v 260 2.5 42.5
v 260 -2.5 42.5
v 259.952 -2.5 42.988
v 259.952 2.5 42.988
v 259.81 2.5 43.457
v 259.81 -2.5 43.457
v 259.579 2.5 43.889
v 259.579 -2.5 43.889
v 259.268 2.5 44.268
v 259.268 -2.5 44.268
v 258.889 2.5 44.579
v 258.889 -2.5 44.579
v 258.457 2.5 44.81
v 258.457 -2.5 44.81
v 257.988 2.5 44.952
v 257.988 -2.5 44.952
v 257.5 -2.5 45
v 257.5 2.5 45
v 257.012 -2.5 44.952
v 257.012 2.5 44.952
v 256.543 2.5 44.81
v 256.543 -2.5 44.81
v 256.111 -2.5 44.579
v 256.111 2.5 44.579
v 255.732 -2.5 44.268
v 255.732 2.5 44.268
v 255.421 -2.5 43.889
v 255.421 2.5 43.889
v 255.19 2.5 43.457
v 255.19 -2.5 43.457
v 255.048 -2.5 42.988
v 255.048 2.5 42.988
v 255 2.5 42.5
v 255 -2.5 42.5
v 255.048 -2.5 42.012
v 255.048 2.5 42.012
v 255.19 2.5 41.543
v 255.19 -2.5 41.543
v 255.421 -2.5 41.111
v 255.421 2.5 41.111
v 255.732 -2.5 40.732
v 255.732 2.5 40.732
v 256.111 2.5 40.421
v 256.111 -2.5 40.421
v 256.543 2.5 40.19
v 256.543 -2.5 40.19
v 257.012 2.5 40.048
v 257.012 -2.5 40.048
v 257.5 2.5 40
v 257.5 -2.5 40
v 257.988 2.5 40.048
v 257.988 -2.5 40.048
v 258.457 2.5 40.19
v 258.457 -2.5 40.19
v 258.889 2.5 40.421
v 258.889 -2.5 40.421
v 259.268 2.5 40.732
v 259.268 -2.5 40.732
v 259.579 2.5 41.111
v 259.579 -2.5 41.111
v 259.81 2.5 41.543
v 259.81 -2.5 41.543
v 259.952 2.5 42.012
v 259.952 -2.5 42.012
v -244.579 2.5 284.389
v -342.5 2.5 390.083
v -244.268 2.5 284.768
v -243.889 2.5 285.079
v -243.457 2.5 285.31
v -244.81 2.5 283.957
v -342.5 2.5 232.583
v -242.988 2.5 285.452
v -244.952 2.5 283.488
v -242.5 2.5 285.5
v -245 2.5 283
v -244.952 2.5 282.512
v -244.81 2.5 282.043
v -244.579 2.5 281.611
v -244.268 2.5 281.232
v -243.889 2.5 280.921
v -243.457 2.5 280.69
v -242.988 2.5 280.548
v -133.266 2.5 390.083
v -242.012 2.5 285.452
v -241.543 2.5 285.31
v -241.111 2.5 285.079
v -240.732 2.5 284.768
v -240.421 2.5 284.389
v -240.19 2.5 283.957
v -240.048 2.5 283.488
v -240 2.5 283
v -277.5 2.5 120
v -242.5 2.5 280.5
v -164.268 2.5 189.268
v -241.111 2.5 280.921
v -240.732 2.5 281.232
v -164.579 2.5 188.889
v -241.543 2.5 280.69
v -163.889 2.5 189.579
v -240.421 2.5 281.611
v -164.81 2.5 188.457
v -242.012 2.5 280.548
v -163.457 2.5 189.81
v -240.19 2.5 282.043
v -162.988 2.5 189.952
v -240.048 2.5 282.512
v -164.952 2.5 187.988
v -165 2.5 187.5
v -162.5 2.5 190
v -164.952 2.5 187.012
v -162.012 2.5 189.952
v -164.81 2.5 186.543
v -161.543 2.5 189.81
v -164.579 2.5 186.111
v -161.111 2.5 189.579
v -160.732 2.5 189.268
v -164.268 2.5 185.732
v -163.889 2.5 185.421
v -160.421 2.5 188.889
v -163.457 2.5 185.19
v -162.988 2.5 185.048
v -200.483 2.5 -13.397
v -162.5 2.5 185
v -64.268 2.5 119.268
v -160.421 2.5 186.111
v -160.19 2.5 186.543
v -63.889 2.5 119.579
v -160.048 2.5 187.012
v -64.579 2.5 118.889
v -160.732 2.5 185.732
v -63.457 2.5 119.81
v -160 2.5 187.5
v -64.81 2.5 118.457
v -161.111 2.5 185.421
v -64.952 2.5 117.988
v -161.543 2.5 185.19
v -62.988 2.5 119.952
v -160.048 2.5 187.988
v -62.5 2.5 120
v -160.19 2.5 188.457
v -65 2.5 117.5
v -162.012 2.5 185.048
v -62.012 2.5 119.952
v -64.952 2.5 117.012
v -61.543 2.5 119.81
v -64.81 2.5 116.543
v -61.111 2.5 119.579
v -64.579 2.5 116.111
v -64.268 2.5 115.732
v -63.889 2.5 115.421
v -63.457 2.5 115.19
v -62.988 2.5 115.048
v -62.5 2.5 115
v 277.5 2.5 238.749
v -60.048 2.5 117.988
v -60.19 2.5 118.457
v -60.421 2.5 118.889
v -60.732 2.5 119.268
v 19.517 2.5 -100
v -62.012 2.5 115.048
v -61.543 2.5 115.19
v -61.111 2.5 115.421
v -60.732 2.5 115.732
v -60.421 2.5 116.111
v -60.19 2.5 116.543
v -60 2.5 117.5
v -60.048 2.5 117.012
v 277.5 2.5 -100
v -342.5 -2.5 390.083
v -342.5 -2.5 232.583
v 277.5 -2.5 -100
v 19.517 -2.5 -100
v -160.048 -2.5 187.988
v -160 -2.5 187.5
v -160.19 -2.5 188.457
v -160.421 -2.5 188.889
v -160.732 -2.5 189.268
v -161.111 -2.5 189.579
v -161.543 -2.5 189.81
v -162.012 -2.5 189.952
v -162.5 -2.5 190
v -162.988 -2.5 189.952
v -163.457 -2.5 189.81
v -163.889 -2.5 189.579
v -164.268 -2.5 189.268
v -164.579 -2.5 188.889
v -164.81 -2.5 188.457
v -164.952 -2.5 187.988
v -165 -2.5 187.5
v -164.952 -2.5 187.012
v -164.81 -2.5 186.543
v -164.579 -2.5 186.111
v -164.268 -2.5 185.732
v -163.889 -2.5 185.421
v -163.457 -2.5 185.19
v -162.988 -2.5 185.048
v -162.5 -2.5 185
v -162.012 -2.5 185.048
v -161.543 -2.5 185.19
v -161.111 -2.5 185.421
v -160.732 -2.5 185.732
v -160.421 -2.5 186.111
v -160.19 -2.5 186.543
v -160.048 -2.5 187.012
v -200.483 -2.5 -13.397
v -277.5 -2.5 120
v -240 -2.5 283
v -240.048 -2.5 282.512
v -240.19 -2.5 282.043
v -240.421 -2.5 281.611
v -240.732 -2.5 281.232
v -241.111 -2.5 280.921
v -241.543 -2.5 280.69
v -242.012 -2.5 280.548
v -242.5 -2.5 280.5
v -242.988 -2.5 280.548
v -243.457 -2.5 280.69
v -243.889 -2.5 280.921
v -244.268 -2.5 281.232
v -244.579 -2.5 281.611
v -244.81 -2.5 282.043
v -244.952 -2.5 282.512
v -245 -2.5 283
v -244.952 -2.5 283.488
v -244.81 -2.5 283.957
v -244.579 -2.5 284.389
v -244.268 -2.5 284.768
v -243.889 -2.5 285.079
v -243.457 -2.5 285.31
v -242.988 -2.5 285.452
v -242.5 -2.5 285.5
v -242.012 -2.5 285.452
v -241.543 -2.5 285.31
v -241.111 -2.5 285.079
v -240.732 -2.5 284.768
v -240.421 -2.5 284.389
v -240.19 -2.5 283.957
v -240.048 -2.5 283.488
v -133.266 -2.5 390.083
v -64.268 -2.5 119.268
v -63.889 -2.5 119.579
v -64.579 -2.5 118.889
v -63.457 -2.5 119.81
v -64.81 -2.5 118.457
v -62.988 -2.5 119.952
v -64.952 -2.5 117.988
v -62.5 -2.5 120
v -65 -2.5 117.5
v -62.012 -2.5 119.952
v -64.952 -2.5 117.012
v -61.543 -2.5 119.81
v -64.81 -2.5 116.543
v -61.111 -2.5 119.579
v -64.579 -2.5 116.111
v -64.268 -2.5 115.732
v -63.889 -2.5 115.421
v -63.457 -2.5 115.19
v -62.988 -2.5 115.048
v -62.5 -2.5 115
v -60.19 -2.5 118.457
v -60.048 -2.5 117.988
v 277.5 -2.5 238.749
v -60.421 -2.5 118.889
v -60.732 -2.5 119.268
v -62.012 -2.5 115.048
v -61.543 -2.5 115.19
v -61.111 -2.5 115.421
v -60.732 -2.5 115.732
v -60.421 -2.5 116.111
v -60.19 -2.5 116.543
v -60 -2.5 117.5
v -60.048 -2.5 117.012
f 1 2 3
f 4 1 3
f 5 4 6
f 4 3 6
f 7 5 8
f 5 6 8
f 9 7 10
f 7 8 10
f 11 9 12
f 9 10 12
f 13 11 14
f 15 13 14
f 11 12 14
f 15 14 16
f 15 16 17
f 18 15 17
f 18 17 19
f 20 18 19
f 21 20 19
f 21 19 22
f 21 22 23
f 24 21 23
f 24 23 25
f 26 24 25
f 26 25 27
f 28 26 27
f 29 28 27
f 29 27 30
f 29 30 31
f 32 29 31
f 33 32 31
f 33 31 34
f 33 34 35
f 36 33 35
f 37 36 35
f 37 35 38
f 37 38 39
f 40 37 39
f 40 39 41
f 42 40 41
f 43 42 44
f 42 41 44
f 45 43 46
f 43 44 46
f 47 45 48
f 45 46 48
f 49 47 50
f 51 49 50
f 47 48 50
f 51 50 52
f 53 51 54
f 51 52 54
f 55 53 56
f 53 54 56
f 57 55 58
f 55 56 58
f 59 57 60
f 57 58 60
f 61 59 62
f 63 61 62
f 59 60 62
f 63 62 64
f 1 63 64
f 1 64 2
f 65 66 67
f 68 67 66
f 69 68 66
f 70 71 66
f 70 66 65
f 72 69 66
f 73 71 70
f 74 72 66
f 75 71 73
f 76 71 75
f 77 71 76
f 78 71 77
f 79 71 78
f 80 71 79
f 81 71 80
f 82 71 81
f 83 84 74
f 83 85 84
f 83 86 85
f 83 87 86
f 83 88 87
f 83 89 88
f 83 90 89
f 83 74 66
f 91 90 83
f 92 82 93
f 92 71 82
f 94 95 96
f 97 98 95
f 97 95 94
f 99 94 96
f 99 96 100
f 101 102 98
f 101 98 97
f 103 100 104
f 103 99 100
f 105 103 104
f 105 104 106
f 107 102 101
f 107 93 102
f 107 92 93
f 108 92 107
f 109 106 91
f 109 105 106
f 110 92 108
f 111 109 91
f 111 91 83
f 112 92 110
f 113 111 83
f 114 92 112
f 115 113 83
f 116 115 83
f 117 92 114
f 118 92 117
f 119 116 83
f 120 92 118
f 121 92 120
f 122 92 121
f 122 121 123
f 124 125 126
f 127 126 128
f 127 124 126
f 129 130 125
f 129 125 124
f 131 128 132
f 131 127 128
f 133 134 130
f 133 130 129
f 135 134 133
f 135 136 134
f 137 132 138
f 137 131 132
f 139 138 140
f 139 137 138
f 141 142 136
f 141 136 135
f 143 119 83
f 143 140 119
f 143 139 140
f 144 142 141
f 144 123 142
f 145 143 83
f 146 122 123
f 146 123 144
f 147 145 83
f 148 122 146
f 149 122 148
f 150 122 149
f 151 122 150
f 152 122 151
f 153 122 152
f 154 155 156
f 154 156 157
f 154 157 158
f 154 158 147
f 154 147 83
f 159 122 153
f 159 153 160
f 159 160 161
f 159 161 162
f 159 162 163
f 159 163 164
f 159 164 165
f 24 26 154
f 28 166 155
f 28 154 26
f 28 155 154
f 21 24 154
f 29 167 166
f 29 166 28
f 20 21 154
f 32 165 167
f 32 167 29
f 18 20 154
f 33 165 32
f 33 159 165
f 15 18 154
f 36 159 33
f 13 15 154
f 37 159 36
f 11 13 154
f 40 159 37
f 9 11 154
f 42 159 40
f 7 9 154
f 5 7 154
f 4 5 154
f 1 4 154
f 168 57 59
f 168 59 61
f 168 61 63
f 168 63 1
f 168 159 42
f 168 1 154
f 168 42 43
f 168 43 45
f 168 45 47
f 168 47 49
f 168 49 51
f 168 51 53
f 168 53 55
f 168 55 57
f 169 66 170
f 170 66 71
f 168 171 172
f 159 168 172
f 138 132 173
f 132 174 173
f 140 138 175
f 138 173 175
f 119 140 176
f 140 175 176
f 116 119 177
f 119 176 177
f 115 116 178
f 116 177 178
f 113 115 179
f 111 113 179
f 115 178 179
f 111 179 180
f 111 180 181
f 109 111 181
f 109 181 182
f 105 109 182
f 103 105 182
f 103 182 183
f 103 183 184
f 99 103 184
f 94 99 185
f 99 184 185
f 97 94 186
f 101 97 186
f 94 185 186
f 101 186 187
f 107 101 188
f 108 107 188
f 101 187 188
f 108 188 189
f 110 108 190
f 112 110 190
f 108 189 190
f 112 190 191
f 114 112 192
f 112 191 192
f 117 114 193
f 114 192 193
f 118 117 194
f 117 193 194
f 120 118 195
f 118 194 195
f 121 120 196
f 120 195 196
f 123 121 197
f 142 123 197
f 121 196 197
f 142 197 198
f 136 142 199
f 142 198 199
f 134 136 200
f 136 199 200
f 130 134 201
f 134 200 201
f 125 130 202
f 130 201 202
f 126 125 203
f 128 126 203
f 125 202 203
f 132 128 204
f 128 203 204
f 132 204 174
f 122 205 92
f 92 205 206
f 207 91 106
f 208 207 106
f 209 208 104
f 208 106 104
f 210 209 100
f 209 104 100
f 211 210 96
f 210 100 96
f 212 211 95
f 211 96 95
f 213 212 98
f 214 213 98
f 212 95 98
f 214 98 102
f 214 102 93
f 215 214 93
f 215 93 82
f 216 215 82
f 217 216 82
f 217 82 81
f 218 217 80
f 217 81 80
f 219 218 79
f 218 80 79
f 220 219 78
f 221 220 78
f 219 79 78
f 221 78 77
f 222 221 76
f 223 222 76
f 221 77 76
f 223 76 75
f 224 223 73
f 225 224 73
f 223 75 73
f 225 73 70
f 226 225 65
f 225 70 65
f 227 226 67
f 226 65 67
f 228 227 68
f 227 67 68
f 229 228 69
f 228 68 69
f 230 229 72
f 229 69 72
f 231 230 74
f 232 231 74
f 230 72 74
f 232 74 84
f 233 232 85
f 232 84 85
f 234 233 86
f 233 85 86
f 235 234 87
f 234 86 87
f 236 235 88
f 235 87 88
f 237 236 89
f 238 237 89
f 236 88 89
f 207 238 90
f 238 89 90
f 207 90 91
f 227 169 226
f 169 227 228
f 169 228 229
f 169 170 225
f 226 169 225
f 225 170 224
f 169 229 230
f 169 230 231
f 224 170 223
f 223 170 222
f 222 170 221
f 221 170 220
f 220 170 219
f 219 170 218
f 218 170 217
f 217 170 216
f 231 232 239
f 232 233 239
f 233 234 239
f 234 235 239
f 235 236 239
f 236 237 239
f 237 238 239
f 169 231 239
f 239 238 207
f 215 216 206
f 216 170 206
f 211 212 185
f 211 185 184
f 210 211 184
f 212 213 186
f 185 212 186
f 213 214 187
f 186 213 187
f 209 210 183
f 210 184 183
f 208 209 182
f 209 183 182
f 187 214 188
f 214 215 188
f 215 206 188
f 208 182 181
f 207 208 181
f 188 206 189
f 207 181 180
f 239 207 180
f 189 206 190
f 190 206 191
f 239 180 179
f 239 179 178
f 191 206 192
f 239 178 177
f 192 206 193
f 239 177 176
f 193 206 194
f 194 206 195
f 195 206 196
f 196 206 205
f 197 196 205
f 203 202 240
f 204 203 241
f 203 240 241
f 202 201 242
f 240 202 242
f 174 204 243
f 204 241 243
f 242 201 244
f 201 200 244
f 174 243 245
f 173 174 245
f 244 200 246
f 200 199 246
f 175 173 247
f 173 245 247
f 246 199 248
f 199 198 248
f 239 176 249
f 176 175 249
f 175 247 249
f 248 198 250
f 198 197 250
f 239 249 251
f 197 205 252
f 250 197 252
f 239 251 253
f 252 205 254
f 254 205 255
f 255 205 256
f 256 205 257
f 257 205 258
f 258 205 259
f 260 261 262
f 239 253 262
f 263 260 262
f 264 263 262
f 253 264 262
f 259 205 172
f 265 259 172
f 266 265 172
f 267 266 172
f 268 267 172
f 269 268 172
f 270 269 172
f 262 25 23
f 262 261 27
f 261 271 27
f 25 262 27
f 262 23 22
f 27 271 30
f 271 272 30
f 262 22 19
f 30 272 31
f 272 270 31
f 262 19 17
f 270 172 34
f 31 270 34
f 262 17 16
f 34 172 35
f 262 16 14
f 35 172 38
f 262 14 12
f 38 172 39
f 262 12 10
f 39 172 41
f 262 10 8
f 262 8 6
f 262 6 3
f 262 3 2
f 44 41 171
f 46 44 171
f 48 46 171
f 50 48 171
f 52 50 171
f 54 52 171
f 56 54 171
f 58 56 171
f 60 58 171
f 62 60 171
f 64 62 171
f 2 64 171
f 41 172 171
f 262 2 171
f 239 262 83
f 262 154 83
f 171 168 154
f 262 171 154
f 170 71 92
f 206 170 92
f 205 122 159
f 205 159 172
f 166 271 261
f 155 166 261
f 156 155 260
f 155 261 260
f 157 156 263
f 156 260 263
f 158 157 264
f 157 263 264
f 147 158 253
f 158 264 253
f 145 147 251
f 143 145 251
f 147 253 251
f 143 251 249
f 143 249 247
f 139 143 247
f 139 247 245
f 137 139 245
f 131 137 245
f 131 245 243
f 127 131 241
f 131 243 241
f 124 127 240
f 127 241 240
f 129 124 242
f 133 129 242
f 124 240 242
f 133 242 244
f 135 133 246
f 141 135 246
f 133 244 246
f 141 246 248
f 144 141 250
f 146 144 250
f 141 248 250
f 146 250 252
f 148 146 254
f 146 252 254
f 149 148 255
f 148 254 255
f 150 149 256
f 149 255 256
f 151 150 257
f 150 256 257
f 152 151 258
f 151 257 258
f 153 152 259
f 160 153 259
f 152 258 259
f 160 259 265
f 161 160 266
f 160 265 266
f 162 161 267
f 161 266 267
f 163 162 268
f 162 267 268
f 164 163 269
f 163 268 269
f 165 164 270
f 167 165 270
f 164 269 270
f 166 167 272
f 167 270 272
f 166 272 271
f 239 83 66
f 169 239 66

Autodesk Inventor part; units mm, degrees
ref_plane "YZ Plane" through (0, 0, 0) normal (1, 0, 0) x (0, 1, 0)
ref_plane "XZ Plane" through (0, 0, 0) normal (0, 1, 0) x (-1, 0, 0)
ref_plane "XY Plane" through (0, 0, 0) normal (0, 0, 1) x (1, 0, 0)
sketch "スケッチ1" plane through (0, 0, 0) normal (0, 1, 0) x (-1, 0, 0)
  line L0 (-277.5, 277.5) -> (277.5, 277.5)
  line L1 (277.5, 277.5) -> (277.5, -277.5)
  line L2 (277.5, -277.5) -> (-277.5, -277.5)
  line L3 (-277.5, -277.5) -> (-277.5, 277.5)
  line L4 (-277.5, 277.5) -> (277.5, -277.5) construction
  line L5 (277.5, 277.5) -> (-277.5, -277.5) construction
  point P0 (0, 0)
  dimension "d0" = 555
  dimension "d1" = 555
extrude "押し出し1" add sketch "スケッチ1" along normal mid plane 5
sketch "スケッチ3" plane through (0, -2.5, 0) normal (0, -1, 0) x (1, 0, 0)
  circle A0 centre (-62.5, 117.5) radius 2.5
  line L0 (277.5, -277.5) -> (277.5, 277.5) projected
  line L1 (-277.5, -277.5) -> (277.5, -277.5) projected
  circle A1 centre (-162.5, 187.5) radius 2.5
  circle A2 centre (257.5, 42.5) radius 2.5
  point P0 (0, 0)
  dimension "d10" = 5
  dimension "d15" = 5
  dimension "d16" = 320
  dimension "d17" = 20
  dimension "d18" = 5
  dimension "d24" = 75
  dimension "d25" = 320
  dimension "d26" = 420
  dimension "d27" = 145
extrude "押し出し4" cut sketch "スケッチ3" against normal through all
sketch "スケッチ5" plane through (0, -2.5, 0) normal (0, -1, 0) x (1, 0, 0)
  line L0 (277.5, 250) -> (-277.5, 250)
  line L1 (-250, 277.5) -> (-250, -277.5) construction
  line L2 (-277.5, -250) -> (277.5, -250)
  line L3 (250, -277.5) -> (250, 277.5) construction
  line L4 (-277.5, 277.5) -> (277.5, 277.5)
  line L5 (-150, 277.5) -> (277.5, 120)
  line L6 (277.5, 277.5) -> (277.5, -277.5)
  line L7 (-277.5, -277.5) -> (-277.5, 277.5)
  line L8 (-277.5, 120) -> (-150.482941, -100)
  line L9 (-150.482941, -100) -> (277.5, -100)
  line L10 (277.5, -277.5) -> (277.5, 277.5)
  point P0 (0, 0)
  dimension "d32" = 100
  dimension "d33" = 130
  dimension "d34" = 350
  dimension "d35" = 60
  dimension "d46" = 220
sketch "スケッチ5 outline for 押し出し5" plane through (0, -2.5, 0) normal (0, -1, 0) x (1, 0, 0)
  line L0 (277.5, 120) -> (277.5, 277.5)
  line L1 (-150, 277.5) -> (277.5, 120)
  line L2 (277.5, 277.5) -> (-150, 277.5)
  line L3 (-277.5, 120) -> (-277.5, -277.5)
  line L4 (-150.482941, -100) -> (-277.5, 120)
  line L5 (277.5, -100) -> (-150.482941, -100)
  line L6 (277.5, -277.5) -> (277.5, -100)
  line L7 (-277.5, -277.5) -> (277.5, -277.5)
extrude "押し出し5" cut sketch "スケッチ5 outline for 押し出し5" against normal through all
chamfer "面取り2" distance 170 distance2 100 1 edges at (-150.4829, 0, -100) measured on face at (134.839, -0.8333, -100)
sketch "スケッチ6" plane through (0, 2.5, 0) normal (0, 1, 0) x (1, 0, 0)
  line L0 (277.5, -120) -> (-150, -277.5)
  line L1 (277.5, -120) -> (277.5, -238.748566)
  line L2 (277.5, -238.748566) -> (-133.265714, -390.083302)
  line L3 (-133.265714, -390.083302) -> (-342.5, -390.083302)
  line L4 (-342.5, -390.083302) -> (-342.5, -232.583302)
  line L5 (-277.5, -277.5) -> (-277.5, -120)
  line L6 (-342.5, -232.583302) -> (-277.5, -120)
  line L7 (-200.482941, 13.39746) -> (-277.5, -120)
  line L8 (-277.5, -277.5) -> (-150, -277.5)
  point P0 (0, 0)
  dimension "d47" = 157.5
  dimension "d55" = 620
extrude "押し出し6" add sketch "スケッチ6" against normal blind 5
sketch "スケッチ7" plane through (0, 2.5, 0) normal (0, 1, 0) x (1, 0, 0)
  circle A0 centre (-242.5, -283) radius 2.5
  line L0 (277.5, -238.748566) -> (277.5, 100)
  line L1 (277.5, 100) -> (19.517059, 100)
  point P0 (0, 0)
  dimension "d50" = 5
  dimension "d51" = 520
  dimension "d52" = 383
extrude "押し出し7" cut sketch "スケッチ7" against normal through all
properties part number "endplate(flap4)"
